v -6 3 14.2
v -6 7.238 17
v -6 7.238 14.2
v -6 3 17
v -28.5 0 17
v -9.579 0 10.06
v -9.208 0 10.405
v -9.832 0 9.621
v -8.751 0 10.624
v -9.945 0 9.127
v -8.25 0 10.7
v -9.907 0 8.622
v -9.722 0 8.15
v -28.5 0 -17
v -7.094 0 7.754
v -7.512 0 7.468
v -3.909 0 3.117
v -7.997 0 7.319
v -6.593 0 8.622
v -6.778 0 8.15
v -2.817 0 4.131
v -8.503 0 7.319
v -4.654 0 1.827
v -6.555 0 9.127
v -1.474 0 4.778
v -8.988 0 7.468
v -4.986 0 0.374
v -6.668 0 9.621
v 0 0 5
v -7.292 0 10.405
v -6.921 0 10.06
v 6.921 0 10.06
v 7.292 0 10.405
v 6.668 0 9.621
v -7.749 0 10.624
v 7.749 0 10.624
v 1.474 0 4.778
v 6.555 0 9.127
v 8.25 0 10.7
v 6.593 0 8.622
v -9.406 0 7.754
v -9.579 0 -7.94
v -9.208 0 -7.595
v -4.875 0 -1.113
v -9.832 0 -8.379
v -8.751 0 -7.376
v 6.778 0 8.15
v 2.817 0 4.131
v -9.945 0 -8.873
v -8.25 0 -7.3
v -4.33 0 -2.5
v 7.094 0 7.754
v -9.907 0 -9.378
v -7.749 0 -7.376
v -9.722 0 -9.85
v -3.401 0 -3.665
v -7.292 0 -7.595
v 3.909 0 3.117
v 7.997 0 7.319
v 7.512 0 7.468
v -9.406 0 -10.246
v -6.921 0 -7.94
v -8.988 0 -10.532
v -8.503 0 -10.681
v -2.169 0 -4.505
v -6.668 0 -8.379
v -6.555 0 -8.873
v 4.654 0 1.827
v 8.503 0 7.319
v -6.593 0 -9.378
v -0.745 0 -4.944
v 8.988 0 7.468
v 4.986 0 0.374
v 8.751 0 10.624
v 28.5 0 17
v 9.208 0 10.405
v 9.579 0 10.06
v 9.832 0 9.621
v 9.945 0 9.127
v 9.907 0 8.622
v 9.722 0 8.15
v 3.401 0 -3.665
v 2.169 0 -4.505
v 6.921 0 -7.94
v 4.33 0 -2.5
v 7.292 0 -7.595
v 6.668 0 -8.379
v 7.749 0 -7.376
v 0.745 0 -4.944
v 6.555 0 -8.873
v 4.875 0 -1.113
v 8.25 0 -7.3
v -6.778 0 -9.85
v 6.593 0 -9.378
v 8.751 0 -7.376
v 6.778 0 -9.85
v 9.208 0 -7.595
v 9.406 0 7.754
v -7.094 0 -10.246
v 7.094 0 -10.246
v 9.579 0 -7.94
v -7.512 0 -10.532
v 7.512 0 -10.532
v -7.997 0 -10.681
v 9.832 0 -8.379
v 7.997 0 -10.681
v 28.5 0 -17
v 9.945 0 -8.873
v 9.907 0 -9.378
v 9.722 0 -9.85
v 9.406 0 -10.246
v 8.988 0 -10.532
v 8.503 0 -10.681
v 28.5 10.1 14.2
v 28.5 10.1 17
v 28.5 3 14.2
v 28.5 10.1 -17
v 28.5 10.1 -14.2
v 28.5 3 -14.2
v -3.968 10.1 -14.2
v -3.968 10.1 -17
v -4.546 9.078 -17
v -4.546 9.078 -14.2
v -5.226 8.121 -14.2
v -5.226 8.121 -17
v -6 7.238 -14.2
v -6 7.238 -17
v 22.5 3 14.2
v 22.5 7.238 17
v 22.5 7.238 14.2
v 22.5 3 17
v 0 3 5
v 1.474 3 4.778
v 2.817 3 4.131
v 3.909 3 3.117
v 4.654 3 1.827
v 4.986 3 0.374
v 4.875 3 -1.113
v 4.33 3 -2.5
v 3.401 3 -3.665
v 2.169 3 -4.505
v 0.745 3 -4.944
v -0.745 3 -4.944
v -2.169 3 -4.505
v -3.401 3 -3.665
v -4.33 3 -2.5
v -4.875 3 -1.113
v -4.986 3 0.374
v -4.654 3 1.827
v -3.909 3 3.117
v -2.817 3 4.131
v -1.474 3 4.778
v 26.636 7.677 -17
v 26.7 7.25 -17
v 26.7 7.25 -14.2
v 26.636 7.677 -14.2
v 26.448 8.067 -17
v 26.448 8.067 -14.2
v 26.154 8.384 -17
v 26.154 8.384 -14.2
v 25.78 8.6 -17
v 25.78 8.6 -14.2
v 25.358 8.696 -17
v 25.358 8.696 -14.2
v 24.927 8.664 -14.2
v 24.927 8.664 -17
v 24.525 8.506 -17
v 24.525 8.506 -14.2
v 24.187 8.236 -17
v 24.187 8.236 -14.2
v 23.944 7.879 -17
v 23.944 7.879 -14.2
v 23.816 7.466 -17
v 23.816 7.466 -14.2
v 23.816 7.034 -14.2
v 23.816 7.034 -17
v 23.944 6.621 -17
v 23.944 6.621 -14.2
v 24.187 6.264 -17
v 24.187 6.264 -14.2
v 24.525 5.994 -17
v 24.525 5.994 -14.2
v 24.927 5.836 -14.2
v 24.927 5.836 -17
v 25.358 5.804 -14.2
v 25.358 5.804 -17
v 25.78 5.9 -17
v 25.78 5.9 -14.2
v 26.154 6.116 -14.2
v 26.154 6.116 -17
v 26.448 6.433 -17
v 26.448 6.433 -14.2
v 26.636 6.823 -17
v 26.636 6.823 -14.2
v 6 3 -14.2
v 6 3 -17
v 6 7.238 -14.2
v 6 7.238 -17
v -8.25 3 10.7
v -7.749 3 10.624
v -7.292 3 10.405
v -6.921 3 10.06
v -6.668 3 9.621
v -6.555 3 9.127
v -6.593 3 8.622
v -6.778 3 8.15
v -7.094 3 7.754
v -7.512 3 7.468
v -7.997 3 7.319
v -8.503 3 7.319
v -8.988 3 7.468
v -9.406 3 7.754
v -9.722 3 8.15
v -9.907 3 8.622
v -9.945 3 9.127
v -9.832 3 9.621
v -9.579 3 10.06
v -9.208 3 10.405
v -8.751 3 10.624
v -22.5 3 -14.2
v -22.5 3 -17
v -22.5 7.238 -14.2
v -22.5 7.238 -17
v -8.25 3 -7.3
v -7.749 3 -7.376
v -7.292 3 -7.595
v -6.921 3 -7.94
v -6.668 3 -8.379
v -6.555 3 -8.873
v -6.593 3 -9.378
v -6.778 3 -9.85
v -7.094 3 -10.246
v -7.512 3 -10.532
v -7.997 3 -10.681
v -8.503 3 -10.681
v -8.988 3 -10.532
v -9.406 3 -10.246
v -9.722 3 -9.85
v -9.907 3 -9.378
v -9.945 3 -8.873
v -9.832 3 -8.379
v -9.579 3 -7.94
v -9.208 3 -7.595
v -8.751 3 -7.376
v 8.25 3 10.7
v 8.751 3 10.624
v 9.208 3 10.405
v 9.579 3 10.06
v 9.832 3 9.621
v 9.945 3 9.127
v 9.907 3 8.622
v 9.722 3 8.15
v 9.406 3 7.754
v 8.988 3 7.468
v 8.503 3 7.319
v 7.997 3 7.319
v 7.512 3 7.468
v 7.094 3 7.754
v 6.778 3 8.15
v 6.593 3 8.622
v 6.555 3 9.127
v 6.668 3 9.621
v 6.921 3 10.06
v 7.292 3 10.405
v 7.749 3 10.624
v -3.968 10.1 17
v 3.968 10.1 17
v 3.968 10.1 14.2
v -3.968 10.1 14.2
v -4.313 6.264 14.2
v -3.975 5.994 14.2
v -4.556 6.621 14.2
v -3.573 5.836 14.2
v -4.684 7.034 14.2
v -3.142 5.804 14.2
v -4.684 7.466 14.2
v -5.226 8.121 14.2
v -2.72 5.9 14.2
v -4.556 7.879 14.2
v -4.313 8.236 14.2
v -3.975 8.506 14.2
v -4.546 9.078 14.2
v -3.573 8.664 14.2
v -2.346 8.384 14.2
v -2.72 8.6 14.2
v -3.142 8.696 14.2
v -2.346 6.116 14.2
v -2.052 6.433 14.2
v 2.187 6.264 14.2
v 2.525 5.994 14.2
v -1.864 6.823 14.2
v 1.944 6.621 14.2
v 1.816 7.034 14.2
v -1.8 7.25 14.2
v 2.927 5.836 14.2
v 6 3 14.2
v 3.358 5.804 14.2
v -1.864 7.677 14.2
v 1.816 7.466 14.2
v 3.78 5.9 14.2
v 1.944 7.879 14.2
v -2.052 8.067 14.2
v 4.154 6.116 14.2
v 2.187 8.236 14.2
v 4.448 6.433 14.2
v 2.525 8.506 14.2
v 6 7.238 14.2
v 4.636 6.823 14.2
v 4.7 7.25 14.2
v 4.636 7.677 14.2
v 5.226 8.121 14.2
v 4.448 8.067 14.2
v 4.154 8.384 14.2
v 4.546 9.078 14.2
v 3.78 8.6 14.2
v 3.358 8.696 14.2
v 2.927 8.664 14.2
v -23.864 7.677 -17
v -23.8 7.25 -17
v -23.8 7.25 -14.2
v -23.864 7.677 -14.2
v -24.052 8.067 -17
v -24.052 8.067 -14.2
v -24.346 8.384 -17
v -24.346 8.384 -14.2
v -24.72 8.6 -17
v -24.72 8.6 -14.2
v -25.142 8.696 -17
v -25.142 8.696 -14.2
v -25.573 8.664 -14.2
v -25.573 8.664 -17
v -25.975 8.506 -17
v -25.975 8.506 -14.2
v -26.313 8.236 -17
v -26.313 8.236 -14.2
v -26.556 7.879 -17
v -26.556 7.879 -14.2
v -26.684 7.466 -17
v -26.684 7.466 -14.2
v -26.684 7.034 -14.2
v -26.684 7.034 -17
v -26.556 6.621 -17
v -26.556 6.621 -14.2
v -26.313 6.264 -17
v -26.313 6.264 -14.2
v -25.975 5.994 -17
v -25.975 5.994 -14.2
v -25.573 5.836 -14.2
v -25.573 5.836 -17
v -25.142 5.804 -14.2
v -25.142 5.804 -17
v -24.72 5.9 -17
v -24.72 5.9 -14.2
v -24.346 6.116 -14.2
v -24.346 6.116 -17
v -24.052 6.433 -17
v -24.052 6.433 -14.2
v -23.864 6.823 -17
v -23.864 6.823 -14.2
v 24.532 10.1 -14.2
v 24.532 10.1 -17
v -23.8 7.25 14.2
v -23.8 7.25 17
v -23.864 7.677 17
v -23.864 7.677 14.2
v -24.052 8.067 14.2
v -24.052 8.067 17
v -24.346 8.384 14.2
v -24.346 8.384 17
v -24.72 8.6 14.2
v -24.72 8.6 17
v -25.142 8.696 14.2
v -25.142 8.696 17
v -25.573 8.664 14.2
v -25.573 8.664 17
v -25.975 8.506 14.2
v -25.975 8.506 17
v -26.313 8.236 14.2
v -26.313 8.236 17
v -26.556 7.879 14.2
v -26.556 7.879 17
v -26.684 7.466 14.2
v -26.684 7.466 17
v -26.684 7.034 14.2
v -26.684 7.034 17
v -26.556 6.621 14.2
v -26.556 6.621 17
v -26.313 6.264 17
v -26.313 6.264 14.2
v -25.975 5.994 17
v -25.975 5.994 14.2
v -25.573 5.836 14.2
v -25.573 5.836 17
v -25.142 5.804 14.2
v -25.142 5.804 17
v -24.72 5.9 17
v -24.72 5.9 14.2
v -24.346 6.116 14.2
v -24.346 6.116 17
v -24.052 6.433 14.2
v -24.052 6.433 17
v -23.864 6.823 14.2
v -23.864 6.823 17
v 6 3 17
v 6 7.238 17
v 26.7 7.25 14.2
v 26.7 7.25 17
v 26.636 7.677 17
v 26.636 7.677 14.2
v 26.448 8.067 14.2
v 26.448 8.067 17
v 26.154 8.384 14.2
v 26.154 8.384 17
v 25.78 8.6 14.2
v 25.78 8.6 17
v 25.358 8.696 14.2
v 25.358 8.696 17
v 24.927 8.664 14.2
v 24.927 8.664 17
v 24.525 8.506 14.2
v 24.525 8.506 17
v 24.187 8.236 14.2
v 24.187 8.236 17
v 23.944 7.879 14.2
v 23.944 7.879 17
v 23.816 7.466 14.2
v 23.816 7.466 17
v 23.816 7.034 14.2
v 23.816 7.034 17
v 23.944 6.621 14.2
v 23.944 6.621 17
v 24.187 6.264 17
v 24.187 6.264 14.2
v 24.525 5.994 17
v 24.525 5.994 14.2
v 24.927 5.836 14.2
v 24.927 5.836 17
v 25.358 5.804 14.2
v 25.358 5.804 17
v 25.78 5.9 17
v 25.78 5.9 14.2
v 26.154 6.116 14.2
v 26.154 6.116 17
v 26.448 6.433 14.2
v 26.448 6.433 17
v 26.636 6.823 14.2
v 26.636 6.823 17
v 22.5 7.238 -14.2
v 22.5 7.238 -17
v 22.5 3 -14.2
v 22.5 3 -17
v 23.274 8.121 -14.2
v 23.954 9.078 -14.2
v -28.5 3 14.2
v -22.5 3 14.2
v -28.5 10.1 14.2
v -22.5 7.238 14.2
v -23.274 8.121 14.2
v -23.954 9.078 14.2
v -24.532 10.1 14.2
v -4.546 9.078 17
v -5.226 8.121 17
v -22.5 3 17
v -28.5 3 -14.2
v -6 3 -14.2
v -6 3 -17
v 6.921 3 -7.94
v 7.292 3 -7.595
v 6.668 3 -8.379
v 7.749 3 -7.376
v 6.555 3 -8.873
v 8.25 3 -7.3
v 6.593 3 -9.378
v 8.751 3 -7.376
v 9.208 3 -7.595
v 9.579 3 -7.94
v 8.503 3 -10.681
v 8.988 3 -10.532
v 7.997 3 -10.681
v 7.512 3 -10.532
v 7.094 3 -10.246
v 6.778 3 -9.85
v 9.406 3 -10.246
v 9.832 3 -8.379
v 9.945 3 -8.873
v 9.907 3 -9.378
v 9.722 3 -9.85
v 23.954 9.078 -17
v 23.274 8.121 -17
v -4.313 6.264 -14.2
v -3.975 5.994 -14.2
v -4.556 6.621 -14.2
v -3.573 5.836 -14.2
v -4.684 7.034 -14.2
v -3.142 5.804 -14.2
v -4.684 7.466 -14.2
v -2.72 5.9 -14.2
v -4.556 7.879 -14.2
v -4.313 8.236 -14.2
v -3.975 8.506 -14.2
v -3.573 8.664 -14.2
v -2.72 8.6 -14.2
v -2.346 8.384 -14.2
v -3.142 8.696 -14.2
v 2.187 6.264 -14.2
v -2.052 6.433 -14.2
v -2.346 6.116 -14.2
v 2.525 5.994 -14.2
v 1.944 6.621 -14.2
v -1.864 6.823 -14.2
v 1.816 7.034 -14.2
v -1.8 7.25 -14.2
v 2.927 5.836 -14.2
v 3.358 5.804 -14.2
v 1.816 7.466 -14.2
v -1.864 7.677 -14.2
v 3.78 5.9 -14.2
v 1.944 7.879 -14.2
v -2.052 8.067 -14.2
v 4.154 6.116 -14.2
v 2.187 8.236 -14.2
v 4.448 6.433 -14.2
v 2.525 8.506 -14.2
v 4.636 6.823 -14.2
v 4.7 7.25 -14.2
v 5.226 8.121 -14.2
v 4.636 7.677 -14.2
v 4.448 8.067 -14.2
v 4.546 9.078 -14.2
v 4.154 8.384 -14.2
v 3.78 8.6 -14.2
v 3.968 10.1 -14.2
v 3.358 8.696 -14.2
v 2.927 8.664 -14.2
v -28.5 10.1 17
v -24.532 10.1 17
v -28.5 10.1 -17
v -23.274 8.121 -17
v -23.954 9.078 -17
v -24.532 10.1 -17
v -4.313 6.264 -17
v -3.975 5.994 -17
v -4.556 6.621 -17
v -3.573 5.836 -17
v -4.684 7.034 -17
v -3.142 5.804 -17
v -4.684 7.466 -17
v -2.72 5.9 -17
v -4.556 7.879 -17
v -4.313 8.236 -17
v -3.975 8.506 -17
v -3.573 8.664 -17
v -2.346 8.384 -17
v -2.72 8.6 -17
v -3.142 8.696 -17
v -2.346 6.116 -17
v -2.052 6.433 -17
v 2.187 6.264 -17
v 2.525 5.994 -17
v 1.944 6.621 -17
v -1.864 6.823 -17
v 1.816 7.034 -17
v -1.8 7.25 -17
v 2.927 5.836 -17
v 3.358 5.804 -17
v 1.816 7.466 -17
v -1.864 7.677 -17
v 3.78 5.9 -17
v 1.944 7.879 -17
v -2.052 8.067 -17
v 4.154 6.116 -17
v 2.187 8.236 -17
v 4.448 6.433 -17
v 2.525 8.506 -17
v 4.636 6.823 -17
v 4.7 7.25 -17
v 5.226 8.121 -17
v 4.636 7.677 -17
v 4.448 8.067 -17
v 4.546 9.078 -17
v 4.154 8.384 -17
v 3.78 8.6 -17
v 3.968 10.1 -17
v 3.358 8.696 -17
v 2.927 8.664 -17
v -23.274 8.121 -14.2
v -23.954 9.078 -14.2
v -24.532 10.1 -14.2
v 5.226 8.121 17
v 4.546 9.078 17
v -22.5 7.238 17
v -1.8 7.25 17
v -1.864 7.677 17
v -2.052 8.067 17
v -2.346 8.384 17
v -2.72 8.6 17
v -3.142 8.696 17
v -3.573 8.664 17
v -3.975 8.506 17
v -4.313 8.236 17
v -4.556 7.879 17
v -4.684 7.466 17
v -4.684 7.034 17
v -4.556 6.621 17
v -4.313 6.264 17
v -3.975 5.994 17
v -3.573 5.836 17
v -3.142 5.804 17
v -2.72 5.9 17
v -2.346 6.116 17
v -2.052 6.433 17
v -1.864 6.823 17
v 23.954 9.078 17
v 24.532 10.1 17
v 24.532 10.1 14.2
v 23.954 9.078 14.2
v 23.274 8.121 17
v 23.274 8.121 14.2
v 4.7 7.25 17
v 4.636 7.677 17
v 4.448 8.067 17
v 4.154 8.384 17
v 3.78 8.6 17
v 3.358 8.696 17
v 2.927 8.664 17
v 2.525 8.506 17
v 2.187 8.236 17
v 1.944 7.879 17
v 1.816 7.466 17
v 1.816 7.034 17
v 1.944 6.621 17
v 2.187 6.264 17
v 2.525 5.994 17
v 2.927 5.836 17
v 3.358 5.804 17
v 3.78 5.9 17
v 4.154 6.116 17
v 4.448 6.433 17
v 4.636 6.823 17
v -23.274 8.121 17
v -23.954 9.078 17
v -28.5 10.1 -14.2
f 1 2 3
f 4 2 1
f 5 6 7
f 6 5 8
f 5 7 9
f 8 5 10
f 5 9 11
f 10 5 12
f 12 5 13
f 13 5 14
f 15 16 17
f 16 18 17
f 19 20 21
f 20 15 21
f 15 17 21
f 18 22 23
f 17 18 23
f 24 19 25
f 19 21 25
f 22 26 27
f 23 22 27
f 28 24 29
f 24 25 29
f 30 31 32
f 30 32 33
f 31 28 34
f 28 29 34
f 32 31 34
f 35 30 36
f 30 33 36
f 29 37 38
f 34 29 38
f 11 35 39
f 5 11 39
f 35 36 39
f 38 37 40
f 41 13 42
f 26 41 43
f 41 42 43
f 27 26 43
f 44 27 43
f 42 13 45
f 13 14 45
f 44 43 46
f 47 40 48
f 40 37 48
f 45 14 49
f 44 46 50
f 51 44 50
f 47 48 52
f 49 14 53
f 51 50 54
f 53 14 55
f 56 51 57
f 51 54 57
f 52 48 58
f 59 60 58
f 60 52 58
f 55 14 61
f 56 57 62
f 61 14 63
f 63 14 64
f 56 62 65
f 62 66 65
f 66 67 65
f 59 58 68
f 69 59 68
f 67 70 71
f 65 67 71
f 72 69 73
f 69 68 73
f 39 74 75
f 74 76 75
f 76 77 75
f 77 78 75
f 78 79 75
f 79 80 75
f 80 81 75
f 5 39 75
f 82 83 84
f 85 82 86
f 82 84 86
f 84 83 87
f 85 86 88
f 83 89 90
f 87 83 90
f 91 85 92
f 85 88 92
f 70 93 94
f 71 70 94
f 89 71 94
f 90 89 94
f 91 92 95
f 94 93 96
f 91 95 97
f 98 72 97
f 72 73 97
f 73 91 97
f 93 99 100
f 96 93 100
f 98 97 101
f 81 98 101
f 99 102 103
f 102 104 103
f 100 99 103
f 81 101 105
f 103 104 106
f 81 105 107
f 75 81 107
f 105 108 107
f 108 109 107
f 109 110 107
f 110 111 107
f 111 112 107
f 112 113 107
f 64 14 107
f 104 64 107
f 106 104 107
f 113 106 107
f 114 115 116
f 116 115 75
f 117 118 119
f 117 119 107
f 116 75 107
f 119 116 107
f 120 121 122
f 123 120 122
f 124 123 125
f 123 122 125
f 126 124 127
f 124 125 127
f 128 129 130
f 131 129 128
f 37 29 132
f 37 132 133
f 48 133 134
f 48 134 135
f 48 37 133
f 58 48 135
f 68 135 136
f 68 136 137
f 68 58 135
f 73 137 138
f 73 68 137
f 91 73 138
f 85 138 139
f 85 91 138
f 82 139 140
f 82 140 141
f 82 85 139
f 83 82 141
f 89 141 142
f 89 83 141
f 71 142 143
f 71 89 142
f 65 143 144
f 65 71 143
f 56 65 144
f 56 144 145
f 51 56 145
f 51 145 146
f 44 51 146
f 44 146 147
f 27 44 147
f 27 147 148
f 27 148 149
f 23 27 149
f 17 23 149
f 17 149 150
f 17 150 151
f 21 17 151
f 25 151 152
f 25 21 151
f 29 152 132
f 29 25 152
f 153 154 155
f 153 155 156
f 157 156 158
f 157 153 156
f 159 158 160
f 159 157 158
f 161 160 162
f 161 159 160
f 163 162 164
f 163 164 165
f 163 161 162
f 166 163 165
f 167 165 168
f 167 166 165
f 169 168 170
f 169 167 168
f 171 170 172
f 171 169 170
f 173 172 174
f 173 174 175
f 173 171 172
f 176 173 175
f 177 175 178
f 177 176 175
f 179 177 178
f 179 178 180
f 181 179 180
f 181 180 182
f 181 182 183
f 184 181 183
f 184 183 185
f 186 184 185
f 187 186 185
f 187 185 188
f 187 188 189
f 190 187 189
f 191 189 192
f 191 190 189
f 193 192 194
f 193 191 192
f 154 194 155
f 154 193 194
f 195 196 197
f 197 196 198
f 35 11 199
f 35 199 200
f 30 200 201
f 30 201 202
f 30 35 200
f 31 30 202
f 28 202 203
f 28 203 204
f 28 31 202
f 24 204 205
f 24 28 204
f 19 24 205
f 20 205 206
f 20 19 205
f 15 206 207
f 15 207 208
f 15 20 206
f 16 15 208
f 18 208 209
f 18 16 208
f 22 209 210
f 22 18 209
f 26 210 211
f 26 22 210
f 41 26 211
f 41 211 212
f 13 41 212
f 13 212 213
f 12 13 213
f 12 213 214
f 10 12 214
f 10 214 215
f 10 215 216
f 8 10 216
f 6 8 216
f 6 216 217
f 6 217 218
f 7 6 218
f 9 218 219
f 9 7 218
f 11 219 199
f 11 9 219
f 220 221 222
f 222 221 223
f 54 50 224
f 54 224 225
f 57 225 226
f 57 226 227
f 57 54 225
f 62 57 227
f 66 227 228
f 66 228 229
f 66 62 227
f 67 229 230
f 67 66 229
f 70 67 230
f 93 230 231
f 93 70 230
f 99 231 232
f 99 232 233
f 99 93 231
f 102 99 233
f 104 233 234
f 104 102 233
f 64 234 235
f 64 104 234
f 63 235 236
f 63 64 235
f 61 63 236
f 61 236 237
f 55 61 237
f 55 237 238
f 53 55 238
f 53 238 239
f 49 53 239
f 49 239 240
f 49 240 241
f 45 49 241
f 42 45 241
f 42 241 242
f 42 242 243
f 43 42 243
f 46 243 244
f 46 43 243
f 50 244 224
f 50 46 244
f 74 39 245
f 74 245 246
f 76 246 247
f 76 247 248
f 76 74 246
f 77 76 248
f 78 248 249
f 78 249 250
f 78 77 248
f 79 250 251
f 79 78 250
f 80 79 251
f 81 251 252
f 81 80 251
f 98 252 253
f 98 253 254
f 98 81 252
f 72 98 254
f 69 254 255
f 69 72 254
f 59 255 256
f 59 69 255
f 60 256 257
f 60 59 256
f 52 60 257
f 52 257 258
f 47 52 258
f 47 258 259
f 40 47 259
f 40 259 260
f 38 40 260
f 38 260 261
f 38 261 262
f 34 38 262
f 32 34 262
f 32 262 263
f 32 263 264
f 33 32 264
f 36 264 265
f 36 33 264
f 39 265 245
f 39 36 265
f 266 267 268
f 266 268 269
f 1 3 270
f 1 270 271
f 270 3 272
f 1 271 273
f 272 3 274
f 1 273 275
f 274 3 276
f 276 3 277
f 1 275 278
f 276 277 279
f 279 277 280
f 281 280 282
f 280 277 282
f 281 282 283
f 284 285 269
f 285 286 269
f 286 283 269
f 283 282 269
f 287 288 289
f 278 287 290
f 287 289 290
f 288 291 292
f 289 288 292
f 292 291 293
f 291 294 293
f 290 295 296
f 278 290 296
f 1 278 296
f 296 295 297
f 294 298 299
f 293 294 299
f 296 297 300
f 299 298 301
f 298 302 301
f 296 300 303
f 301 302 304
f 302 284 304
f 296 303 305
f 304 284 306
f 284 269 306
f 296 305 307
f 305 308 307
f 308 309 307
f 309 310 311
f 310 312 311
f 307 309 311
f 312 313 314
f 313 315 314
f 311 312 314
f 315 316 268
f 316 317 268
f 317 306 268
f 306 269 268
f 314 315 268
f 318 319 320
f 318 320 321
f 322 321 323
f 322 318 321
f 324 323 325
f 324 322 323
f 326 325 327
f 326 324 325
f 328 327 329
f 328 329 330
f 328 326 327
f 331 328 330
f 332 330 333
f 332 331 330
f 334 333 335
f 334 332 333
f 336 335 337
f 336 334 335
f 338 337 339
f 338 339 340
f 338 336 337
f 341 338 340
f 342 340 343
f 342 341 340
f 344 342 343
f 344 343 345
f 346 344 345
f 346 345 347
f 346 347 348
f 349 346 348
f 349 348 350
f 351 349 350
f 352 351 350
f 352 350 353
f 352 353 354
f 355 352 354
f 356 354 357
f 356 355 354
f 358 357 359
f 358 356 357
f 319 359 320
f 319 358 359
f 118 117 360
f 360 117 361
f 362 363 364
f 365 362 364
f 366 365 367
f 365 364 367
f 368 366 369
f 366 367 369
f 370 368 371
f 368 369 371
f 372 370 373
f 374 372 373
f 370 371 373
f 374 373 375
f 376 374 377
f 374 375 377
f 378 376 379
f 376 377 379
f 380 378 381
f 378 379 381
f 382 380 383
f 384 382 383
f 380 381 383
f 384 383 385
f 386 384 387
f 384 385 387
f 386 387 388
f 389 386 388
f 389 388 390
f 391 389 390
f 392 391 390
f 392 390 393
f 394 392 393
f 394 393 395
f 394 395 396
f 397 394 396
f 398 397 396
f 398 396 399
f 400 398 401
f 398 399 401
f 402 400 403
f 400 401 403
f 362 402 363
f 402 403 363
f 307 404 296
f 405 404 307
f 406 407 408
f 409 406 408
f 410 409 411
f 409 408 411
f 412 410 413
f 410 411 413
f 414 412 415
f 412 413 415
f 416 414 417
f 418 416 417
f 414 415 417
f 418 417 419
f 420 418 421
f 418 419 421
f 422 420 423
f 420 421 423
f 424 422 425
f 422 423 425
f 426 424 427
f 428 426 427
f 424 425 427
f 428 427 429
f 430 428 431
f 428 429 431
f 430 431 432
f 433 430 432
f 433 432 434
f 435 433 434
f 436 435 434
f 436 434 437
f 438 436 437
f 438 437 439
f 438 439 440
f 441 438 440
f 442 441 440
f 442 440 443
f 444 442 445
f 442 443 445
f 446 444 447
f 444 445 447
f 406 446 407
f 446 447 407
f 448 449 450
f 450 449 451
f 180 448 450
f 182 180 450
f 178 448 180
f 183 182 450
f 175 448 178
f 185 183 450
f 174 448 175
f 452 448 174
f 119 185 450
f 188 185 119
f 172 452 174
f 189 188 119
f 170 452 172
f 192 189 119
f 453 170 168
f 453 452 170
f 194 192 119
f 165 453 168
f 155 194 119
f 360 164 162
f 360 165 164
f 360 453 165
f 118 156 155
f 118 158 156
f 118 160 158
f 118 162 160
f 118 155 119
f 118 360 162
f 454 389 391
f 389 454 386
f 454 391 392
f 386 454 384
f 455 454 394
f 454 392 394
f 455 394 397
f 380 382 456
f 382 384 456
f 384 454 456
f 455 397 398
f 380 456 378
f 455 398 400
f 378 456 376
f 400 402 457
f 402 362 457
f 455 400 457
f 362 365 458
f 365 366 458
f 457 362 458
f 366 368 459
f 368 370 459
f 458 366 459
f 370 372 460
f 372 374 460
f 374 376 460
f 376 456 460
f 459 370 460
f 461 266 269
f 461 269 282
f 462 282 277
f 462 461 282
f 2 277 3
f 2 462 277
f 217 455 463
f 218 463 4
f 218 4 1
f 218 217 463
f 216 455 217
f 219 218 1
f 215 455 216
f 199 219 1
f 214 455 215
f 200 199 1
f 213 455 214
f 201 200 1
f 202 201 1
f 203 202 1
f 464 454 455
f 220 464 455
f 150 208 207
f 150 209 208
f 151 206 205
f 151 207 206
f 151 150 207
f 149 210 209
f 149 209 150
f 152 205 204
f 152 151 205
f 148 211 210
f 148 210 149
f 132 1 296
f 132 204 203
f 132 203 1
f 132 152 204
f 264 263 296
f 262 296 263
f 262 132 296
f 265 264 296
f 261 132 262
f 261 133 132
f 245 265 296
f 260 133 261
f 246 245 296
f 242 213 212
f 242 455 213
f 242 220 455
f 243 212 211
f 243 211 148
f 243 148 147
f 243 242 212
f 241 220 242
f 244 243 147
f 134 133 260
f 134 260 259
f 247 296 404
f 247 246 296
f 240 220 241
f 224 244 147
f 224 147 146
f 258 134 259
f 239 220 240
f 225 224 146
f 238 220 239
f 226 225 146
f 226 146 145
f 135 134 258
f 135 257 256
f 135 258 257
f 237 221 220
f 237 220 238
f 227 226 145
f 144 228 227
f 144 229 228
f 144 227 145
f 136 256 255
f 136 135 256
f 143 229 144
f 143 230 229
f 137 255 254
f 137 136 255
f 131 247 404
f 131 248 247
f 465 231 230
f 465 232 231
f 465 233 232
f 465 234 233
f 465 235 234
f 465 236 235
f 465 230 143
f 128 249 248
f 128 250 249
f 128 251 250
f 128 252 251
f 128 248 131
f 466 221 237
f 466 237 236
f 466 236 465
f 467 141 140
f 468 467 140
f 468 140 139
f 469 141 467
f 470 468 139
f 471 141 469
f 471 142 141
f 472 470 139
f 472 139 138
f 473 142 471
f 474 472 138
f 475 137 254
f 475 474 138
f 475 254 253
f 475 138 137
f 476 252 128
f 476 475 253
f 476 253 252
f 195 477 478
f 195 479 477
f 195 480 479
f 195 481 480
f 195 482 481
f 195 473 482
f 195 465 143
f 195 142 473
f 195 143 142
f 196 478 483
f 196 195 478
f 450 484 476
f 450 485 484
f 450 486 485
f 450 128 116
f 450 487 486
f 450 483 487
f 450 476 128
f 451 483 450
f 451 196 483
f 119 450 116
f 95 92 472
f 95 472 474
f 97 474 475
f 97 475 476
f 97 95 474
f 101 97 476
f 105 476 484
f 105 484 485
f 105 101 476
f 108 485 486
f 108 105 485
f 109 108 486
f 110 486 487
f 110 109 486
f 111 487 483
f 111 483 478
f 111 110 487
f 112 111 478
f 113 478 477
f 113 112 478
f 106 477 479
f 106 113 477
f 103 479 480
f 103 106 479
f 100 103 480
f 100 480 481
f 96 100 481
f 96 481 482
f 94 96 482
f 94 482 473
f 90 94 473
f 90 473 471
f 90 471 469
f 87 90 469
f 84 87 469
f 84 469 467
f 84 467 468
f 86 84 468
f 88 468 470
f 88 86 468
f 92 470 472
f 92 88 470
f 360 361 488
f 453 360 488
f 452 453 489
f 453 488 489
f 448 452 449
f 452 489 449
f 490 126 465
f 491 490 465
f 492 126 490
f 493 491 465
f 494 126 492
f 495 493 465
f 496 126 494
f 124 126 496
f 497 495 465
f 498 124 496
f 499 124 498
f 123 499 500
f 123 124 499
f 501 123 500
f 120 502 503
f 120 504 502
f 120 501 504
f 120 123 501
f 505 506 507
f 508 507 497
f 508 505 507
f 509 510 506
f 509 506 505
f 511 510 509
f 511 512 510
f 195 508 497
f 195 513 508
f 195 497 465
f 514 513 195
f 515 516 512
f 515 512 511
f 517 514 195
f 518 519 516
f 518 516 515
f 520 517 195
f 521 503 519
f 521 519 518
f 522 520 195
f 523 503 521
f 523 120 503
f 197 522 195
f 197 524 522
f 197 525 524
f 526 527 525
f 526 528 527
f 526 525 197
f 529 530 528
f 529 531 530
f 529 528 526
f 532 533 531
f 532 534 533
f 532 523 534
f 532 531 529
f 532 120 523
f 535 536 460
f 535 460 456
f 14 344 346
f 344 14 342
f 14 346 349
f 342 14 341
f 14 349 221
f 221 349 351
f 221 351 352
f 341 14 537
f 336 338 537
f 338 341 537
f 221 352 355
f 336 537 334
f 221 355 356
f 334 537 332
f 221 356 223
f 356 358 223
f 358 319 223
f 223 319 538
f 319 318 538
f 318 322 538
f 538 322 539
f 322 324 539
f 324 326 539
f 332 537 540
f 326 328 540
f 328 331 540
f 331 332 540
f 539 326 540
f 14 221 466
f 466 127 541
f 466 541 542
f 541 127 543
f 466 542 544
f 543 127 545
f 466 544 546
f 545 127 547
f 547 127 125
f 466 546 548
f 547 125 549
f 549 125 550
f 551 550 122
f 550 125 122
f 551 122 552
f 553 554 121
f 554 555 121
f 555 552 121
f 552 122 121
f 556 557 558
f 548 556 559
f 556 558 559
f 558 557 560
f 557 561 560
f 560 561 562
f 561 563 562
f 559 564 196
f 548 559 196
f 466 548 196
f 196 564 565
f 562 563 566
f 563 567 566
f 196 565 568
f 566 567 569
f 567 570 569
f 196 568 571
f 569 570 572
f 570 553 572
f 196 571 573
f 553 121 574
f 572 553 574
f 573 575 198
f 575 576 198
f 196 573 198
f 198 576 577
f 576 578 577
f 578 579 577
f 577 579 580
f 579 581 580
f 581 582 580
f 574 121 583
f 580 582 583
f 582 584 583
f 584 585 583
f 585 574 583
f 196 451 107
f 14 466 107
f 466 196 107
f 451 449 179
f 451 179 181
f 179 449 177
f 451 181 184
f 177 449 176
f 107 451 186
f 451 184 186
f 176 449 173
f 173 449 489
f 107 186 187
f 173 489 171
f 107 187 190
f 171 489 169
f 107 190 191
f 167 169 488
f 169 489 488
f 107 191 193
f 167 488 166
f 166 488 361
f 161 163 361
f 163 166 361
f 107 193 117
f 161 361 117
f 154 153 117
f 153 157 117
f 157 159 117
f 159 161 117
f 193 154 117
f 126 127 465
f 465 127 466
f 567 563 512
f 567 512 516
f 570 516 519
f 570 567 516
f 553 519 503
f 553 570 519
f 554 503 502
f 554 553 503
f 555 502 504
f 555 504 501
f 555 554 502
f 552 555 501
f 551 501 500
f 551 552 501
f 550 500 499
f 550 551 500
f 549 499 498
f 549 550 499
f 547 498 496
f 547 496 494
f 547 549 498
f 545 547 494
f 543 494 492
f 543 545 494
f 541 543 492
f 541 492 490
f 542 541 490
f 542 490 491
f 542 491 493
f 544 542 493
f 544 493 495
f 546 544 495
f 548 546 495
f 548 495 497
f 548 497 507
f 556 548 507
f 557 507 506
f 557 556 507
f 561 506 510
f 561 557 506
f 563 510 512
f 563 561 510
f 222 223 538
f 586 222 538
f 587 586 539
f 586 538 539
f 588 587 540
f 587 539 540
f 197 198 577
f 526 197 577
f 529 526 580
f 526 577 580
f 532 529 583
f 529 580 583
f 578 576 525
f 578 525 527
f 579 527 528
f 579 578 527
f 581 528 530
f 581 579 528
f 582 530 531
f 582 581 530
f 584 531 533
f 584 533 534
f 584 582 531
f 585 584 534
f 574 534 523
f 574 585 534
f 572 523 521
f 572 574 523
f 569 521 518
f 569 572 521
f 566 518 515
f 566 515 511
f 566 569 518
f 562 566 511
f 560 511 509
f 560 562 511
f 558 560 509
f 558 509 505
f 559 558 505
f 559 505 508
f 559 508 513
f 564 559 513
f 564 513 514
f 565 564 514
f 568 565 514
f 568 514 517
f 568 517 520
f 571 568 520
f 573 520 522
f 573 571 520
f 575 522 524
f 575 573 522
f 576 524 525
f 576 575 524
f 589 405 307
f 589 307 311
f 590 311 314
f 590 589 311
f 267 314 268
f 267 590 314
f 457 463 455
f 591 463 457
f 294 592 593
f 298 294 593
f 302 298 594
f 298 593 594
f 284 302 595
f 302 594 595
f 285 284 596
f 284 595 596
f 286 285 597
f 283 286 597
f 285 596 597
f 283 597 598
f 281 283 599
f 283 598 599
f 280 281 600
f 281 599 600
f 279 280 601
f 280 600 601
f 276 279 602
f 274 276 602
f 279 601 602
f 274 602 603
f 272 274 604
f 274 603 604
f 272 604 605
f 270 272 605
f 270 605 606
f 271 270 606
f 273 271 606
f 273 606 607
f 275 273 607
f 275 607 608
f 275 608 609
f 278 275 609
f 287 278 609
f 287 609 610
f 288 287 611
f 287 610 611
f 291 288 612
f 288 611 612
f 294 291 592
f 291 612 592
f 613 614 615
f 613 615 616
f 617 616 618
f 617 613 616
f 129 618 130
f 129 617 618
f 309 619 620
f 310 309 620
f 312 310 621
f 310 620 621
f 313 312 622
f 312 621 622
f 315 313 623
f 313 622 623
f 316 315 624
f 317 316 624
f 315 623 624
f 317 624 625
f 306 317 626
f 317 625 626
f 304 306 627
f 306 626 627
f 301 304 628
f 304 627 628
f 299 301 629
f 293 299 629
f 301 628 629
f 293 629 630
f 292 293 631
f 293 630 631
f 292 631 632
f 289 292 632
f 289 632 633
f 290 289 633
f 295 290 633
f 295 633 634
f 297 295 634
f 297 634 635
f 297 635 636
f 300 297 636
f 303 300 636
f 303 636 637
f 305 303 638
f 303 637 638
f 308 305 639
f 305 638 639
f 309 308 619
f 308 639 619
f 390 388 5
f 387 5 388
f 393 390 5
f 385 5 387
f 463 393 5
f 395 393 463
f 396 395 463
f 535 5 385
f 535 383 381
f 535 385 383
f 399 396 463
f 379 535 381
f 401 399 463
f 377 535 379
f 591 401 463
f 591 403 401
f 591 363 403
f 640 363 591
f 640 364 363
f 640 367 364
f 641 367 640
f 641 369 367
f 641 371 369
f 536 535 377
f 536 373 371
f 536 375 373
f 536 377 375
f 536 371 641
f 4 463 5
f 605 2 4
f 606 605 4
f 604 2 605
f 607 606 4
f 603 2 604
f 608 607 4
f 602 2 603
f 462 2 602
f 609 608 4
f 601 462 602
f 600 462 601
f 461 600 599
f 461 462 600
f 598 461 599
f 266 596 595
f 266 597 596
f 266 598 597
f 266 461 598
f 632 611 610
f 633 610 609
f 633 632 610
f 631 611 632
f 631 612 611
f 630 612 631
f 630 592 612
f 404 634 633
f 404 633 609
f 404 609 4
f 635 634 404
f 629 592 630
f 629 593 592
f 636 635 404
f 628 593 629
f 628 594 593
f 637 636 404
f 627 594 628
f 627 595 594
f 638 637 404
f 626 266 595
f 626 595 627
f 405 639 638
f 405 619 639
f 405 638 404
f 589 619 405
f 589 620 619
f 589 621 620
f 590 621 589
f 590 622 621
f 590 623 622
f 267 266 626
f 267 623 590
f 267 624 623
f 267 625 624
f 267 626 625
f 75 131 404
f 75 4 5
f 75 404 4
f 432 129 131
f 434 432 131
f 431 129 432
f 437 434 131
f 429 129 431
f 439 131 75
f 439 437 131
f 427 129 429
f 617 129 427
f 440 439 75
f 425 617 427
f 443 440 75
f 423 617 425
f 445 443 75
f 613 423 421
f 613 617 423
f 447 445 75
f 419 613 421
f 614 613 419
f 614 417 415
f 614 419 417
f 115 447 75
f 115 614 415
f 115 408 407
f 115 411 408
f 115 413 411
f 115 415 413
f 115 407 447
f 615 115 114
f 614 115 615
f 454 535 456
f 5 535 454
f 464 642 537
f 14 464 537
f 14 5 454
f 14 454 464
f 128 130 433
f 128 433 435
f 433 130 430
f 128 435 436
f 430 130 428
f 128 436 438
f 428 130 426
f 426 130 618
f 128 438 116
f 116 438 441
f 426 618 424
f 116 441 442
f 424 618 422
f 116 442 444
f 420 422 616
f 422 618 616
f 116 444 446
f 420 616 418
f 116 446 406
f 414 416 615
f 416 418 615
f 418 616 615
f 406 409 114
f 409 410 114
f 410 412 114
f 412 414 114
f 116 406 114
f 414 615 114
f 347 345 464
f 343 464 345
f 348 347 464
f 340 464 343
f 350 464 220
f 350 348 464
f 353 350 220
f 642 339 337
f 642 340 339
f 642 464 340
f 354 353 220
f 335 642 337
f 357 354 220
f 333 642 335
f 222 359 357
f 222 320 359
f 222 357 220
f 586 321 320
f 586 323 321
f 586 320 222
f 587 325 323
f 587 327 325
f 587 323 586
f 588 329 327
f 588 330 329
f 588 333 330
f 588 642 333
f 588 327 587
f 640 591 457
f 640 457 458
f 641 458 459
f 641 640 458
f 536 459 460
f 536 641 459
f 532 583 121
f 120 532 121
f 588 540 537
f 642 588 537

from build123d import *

# Parameters (mm, degrees)
SKETCH1_W           = 57
SKETCH1_H           = 34
SKETCH1_R           = 5
SKETCH1_R_2         = 1.7
BOSS_EXTRUDE1_DEPTH = 3
SKETCH6_R           = 1.45
BOSS_EXTRUDE3_DEPTH = 2.8


with BuildPart() as part:
    # Sketch1 → Boss-Extrude1 (new body)
    with BuildSketch(Plane(origin=(0, 0, 0), x_dir=(1, 0, 0), z_dir=(0, 1, 0))):
        Rectangle(SKETCH1_W, SKETCH1_H)
        with Locations(Location((0, 0, 0), (0, 0, 270))):
            Circle(SKETCH1_R, mode=Mode.SUBTRACT)
        with Locations(Location((-8.25, 9, 0), (0, 0, 270))):
            Circle(SKETCH1_R_2, mode=Mode.SUBTRACT)
        with Locations(Location((8.25, 9, 0), (0, 0, 270))):
            Circle(SKETCH1_R_2, mode=Mode.SUBTRACT)
        with Locations(Location((8.25, -9, 0), (0, 0, 270))):
            Circle(SKETCH1_R_2, mode=Mode.SUBTRACT)
        with Locations(Location((-8.25, -9, 0), (0, 0, 270))):
            Circle(SKETCH1_R_2, mode=Mode.SUBTRACT)
    extrude(amount=BOSS_EXTRUDE1_DEPTH)

    # Sketch6 → Boss-Extrude3 (add)
    # profile 1 of 4: a face of its own
    with BuildSketch(Plane.XY.offset(17)):
        with BuildLine():
            Line((22.5, 7.238289821), (22.5, 3))
            Line((22.5, 3), (28.5, 3))
            Line((28.5, 3), (28.5, 10.1))
            Line((28.5, 10.1), (24.532387855, 10.1))
            ThreePointArc((24.532387855, 10.1), (23.626017075, 8.591148462), (22.5, 7.238289821))
        make_face()
        with Locations((25.25, 7.25)):
            Circle(SKETCH6_R, mode=Mode.SUBTRACT)
    # profile 2 of 4: a face of its own
    with BuildSketch(Plane.XY.offset(17)):
        with BuildLine():
            Line((0, 10.1), (0, 3))
            Line((0, 3), (6, 3))
            Line((6, 3), (6, 7.238289821))
            ThreePointArc((6, 7.238289821), (4.873982925, 8.591148462), (3.967612145, 10.1))
            Line((3.967612145, 10.1), (0, 10.1))
        make_face()
        with Locations((3.25, 7.25)):
            Circle(SKETCH6_R, mode=Mode.SUBTRACT)
    # profile 3 of 4: a face of its own
    with BuildSketch(Plane.XY.offset(17)):
        with BuildLine():
            Line((-6, 7.238289821), (-6, 3))
            Line((-6, 3), (0, 3))
            Line((0, 3), (0, 10.1))
            Line((0, 10.1), (-3.967612145, 10.1))
            ThreePointArc((-3.967612145, 10.1), (-4.873982925, 8.591148462), (-6, 7.238289821))
        make_face()
        with Locations((-3.25, 7.25)):
            Circle(SKETCH6_R, mode=Mode.SUBTRACT)
    # profile 4 of 4: a face of its own
    with BuildSketch(Plane.XY.offset(17)):
        with BuildLine():
            Line((-28.5, 10.1), (-28.5, 3))
            Line((-28.5, 3), (-22.5, 3))
            Line((-22.5, 3), (-22.5, 7.238289821))
            ThreePointArc((-22.5, 7.238289821), (-23.626017075, 8.591148462), (-24.532387855, 10.1))
            Line((-24.532387855, 10.1), (-28.5, 10.1))
        make_face()
        with Locations((-25.25, 7.25)):
            Circle(SKETCH6_R, mode=Mode.SUBTRACT)
    boss_extrude3 = extrude(amount=-BOSS_EXTRUDE3_DEPTH)

    # Mirror2: Boss-Extrude3 across plane
    add(boss_extrude3.mirror(Plane.XY))


solid = part.part
